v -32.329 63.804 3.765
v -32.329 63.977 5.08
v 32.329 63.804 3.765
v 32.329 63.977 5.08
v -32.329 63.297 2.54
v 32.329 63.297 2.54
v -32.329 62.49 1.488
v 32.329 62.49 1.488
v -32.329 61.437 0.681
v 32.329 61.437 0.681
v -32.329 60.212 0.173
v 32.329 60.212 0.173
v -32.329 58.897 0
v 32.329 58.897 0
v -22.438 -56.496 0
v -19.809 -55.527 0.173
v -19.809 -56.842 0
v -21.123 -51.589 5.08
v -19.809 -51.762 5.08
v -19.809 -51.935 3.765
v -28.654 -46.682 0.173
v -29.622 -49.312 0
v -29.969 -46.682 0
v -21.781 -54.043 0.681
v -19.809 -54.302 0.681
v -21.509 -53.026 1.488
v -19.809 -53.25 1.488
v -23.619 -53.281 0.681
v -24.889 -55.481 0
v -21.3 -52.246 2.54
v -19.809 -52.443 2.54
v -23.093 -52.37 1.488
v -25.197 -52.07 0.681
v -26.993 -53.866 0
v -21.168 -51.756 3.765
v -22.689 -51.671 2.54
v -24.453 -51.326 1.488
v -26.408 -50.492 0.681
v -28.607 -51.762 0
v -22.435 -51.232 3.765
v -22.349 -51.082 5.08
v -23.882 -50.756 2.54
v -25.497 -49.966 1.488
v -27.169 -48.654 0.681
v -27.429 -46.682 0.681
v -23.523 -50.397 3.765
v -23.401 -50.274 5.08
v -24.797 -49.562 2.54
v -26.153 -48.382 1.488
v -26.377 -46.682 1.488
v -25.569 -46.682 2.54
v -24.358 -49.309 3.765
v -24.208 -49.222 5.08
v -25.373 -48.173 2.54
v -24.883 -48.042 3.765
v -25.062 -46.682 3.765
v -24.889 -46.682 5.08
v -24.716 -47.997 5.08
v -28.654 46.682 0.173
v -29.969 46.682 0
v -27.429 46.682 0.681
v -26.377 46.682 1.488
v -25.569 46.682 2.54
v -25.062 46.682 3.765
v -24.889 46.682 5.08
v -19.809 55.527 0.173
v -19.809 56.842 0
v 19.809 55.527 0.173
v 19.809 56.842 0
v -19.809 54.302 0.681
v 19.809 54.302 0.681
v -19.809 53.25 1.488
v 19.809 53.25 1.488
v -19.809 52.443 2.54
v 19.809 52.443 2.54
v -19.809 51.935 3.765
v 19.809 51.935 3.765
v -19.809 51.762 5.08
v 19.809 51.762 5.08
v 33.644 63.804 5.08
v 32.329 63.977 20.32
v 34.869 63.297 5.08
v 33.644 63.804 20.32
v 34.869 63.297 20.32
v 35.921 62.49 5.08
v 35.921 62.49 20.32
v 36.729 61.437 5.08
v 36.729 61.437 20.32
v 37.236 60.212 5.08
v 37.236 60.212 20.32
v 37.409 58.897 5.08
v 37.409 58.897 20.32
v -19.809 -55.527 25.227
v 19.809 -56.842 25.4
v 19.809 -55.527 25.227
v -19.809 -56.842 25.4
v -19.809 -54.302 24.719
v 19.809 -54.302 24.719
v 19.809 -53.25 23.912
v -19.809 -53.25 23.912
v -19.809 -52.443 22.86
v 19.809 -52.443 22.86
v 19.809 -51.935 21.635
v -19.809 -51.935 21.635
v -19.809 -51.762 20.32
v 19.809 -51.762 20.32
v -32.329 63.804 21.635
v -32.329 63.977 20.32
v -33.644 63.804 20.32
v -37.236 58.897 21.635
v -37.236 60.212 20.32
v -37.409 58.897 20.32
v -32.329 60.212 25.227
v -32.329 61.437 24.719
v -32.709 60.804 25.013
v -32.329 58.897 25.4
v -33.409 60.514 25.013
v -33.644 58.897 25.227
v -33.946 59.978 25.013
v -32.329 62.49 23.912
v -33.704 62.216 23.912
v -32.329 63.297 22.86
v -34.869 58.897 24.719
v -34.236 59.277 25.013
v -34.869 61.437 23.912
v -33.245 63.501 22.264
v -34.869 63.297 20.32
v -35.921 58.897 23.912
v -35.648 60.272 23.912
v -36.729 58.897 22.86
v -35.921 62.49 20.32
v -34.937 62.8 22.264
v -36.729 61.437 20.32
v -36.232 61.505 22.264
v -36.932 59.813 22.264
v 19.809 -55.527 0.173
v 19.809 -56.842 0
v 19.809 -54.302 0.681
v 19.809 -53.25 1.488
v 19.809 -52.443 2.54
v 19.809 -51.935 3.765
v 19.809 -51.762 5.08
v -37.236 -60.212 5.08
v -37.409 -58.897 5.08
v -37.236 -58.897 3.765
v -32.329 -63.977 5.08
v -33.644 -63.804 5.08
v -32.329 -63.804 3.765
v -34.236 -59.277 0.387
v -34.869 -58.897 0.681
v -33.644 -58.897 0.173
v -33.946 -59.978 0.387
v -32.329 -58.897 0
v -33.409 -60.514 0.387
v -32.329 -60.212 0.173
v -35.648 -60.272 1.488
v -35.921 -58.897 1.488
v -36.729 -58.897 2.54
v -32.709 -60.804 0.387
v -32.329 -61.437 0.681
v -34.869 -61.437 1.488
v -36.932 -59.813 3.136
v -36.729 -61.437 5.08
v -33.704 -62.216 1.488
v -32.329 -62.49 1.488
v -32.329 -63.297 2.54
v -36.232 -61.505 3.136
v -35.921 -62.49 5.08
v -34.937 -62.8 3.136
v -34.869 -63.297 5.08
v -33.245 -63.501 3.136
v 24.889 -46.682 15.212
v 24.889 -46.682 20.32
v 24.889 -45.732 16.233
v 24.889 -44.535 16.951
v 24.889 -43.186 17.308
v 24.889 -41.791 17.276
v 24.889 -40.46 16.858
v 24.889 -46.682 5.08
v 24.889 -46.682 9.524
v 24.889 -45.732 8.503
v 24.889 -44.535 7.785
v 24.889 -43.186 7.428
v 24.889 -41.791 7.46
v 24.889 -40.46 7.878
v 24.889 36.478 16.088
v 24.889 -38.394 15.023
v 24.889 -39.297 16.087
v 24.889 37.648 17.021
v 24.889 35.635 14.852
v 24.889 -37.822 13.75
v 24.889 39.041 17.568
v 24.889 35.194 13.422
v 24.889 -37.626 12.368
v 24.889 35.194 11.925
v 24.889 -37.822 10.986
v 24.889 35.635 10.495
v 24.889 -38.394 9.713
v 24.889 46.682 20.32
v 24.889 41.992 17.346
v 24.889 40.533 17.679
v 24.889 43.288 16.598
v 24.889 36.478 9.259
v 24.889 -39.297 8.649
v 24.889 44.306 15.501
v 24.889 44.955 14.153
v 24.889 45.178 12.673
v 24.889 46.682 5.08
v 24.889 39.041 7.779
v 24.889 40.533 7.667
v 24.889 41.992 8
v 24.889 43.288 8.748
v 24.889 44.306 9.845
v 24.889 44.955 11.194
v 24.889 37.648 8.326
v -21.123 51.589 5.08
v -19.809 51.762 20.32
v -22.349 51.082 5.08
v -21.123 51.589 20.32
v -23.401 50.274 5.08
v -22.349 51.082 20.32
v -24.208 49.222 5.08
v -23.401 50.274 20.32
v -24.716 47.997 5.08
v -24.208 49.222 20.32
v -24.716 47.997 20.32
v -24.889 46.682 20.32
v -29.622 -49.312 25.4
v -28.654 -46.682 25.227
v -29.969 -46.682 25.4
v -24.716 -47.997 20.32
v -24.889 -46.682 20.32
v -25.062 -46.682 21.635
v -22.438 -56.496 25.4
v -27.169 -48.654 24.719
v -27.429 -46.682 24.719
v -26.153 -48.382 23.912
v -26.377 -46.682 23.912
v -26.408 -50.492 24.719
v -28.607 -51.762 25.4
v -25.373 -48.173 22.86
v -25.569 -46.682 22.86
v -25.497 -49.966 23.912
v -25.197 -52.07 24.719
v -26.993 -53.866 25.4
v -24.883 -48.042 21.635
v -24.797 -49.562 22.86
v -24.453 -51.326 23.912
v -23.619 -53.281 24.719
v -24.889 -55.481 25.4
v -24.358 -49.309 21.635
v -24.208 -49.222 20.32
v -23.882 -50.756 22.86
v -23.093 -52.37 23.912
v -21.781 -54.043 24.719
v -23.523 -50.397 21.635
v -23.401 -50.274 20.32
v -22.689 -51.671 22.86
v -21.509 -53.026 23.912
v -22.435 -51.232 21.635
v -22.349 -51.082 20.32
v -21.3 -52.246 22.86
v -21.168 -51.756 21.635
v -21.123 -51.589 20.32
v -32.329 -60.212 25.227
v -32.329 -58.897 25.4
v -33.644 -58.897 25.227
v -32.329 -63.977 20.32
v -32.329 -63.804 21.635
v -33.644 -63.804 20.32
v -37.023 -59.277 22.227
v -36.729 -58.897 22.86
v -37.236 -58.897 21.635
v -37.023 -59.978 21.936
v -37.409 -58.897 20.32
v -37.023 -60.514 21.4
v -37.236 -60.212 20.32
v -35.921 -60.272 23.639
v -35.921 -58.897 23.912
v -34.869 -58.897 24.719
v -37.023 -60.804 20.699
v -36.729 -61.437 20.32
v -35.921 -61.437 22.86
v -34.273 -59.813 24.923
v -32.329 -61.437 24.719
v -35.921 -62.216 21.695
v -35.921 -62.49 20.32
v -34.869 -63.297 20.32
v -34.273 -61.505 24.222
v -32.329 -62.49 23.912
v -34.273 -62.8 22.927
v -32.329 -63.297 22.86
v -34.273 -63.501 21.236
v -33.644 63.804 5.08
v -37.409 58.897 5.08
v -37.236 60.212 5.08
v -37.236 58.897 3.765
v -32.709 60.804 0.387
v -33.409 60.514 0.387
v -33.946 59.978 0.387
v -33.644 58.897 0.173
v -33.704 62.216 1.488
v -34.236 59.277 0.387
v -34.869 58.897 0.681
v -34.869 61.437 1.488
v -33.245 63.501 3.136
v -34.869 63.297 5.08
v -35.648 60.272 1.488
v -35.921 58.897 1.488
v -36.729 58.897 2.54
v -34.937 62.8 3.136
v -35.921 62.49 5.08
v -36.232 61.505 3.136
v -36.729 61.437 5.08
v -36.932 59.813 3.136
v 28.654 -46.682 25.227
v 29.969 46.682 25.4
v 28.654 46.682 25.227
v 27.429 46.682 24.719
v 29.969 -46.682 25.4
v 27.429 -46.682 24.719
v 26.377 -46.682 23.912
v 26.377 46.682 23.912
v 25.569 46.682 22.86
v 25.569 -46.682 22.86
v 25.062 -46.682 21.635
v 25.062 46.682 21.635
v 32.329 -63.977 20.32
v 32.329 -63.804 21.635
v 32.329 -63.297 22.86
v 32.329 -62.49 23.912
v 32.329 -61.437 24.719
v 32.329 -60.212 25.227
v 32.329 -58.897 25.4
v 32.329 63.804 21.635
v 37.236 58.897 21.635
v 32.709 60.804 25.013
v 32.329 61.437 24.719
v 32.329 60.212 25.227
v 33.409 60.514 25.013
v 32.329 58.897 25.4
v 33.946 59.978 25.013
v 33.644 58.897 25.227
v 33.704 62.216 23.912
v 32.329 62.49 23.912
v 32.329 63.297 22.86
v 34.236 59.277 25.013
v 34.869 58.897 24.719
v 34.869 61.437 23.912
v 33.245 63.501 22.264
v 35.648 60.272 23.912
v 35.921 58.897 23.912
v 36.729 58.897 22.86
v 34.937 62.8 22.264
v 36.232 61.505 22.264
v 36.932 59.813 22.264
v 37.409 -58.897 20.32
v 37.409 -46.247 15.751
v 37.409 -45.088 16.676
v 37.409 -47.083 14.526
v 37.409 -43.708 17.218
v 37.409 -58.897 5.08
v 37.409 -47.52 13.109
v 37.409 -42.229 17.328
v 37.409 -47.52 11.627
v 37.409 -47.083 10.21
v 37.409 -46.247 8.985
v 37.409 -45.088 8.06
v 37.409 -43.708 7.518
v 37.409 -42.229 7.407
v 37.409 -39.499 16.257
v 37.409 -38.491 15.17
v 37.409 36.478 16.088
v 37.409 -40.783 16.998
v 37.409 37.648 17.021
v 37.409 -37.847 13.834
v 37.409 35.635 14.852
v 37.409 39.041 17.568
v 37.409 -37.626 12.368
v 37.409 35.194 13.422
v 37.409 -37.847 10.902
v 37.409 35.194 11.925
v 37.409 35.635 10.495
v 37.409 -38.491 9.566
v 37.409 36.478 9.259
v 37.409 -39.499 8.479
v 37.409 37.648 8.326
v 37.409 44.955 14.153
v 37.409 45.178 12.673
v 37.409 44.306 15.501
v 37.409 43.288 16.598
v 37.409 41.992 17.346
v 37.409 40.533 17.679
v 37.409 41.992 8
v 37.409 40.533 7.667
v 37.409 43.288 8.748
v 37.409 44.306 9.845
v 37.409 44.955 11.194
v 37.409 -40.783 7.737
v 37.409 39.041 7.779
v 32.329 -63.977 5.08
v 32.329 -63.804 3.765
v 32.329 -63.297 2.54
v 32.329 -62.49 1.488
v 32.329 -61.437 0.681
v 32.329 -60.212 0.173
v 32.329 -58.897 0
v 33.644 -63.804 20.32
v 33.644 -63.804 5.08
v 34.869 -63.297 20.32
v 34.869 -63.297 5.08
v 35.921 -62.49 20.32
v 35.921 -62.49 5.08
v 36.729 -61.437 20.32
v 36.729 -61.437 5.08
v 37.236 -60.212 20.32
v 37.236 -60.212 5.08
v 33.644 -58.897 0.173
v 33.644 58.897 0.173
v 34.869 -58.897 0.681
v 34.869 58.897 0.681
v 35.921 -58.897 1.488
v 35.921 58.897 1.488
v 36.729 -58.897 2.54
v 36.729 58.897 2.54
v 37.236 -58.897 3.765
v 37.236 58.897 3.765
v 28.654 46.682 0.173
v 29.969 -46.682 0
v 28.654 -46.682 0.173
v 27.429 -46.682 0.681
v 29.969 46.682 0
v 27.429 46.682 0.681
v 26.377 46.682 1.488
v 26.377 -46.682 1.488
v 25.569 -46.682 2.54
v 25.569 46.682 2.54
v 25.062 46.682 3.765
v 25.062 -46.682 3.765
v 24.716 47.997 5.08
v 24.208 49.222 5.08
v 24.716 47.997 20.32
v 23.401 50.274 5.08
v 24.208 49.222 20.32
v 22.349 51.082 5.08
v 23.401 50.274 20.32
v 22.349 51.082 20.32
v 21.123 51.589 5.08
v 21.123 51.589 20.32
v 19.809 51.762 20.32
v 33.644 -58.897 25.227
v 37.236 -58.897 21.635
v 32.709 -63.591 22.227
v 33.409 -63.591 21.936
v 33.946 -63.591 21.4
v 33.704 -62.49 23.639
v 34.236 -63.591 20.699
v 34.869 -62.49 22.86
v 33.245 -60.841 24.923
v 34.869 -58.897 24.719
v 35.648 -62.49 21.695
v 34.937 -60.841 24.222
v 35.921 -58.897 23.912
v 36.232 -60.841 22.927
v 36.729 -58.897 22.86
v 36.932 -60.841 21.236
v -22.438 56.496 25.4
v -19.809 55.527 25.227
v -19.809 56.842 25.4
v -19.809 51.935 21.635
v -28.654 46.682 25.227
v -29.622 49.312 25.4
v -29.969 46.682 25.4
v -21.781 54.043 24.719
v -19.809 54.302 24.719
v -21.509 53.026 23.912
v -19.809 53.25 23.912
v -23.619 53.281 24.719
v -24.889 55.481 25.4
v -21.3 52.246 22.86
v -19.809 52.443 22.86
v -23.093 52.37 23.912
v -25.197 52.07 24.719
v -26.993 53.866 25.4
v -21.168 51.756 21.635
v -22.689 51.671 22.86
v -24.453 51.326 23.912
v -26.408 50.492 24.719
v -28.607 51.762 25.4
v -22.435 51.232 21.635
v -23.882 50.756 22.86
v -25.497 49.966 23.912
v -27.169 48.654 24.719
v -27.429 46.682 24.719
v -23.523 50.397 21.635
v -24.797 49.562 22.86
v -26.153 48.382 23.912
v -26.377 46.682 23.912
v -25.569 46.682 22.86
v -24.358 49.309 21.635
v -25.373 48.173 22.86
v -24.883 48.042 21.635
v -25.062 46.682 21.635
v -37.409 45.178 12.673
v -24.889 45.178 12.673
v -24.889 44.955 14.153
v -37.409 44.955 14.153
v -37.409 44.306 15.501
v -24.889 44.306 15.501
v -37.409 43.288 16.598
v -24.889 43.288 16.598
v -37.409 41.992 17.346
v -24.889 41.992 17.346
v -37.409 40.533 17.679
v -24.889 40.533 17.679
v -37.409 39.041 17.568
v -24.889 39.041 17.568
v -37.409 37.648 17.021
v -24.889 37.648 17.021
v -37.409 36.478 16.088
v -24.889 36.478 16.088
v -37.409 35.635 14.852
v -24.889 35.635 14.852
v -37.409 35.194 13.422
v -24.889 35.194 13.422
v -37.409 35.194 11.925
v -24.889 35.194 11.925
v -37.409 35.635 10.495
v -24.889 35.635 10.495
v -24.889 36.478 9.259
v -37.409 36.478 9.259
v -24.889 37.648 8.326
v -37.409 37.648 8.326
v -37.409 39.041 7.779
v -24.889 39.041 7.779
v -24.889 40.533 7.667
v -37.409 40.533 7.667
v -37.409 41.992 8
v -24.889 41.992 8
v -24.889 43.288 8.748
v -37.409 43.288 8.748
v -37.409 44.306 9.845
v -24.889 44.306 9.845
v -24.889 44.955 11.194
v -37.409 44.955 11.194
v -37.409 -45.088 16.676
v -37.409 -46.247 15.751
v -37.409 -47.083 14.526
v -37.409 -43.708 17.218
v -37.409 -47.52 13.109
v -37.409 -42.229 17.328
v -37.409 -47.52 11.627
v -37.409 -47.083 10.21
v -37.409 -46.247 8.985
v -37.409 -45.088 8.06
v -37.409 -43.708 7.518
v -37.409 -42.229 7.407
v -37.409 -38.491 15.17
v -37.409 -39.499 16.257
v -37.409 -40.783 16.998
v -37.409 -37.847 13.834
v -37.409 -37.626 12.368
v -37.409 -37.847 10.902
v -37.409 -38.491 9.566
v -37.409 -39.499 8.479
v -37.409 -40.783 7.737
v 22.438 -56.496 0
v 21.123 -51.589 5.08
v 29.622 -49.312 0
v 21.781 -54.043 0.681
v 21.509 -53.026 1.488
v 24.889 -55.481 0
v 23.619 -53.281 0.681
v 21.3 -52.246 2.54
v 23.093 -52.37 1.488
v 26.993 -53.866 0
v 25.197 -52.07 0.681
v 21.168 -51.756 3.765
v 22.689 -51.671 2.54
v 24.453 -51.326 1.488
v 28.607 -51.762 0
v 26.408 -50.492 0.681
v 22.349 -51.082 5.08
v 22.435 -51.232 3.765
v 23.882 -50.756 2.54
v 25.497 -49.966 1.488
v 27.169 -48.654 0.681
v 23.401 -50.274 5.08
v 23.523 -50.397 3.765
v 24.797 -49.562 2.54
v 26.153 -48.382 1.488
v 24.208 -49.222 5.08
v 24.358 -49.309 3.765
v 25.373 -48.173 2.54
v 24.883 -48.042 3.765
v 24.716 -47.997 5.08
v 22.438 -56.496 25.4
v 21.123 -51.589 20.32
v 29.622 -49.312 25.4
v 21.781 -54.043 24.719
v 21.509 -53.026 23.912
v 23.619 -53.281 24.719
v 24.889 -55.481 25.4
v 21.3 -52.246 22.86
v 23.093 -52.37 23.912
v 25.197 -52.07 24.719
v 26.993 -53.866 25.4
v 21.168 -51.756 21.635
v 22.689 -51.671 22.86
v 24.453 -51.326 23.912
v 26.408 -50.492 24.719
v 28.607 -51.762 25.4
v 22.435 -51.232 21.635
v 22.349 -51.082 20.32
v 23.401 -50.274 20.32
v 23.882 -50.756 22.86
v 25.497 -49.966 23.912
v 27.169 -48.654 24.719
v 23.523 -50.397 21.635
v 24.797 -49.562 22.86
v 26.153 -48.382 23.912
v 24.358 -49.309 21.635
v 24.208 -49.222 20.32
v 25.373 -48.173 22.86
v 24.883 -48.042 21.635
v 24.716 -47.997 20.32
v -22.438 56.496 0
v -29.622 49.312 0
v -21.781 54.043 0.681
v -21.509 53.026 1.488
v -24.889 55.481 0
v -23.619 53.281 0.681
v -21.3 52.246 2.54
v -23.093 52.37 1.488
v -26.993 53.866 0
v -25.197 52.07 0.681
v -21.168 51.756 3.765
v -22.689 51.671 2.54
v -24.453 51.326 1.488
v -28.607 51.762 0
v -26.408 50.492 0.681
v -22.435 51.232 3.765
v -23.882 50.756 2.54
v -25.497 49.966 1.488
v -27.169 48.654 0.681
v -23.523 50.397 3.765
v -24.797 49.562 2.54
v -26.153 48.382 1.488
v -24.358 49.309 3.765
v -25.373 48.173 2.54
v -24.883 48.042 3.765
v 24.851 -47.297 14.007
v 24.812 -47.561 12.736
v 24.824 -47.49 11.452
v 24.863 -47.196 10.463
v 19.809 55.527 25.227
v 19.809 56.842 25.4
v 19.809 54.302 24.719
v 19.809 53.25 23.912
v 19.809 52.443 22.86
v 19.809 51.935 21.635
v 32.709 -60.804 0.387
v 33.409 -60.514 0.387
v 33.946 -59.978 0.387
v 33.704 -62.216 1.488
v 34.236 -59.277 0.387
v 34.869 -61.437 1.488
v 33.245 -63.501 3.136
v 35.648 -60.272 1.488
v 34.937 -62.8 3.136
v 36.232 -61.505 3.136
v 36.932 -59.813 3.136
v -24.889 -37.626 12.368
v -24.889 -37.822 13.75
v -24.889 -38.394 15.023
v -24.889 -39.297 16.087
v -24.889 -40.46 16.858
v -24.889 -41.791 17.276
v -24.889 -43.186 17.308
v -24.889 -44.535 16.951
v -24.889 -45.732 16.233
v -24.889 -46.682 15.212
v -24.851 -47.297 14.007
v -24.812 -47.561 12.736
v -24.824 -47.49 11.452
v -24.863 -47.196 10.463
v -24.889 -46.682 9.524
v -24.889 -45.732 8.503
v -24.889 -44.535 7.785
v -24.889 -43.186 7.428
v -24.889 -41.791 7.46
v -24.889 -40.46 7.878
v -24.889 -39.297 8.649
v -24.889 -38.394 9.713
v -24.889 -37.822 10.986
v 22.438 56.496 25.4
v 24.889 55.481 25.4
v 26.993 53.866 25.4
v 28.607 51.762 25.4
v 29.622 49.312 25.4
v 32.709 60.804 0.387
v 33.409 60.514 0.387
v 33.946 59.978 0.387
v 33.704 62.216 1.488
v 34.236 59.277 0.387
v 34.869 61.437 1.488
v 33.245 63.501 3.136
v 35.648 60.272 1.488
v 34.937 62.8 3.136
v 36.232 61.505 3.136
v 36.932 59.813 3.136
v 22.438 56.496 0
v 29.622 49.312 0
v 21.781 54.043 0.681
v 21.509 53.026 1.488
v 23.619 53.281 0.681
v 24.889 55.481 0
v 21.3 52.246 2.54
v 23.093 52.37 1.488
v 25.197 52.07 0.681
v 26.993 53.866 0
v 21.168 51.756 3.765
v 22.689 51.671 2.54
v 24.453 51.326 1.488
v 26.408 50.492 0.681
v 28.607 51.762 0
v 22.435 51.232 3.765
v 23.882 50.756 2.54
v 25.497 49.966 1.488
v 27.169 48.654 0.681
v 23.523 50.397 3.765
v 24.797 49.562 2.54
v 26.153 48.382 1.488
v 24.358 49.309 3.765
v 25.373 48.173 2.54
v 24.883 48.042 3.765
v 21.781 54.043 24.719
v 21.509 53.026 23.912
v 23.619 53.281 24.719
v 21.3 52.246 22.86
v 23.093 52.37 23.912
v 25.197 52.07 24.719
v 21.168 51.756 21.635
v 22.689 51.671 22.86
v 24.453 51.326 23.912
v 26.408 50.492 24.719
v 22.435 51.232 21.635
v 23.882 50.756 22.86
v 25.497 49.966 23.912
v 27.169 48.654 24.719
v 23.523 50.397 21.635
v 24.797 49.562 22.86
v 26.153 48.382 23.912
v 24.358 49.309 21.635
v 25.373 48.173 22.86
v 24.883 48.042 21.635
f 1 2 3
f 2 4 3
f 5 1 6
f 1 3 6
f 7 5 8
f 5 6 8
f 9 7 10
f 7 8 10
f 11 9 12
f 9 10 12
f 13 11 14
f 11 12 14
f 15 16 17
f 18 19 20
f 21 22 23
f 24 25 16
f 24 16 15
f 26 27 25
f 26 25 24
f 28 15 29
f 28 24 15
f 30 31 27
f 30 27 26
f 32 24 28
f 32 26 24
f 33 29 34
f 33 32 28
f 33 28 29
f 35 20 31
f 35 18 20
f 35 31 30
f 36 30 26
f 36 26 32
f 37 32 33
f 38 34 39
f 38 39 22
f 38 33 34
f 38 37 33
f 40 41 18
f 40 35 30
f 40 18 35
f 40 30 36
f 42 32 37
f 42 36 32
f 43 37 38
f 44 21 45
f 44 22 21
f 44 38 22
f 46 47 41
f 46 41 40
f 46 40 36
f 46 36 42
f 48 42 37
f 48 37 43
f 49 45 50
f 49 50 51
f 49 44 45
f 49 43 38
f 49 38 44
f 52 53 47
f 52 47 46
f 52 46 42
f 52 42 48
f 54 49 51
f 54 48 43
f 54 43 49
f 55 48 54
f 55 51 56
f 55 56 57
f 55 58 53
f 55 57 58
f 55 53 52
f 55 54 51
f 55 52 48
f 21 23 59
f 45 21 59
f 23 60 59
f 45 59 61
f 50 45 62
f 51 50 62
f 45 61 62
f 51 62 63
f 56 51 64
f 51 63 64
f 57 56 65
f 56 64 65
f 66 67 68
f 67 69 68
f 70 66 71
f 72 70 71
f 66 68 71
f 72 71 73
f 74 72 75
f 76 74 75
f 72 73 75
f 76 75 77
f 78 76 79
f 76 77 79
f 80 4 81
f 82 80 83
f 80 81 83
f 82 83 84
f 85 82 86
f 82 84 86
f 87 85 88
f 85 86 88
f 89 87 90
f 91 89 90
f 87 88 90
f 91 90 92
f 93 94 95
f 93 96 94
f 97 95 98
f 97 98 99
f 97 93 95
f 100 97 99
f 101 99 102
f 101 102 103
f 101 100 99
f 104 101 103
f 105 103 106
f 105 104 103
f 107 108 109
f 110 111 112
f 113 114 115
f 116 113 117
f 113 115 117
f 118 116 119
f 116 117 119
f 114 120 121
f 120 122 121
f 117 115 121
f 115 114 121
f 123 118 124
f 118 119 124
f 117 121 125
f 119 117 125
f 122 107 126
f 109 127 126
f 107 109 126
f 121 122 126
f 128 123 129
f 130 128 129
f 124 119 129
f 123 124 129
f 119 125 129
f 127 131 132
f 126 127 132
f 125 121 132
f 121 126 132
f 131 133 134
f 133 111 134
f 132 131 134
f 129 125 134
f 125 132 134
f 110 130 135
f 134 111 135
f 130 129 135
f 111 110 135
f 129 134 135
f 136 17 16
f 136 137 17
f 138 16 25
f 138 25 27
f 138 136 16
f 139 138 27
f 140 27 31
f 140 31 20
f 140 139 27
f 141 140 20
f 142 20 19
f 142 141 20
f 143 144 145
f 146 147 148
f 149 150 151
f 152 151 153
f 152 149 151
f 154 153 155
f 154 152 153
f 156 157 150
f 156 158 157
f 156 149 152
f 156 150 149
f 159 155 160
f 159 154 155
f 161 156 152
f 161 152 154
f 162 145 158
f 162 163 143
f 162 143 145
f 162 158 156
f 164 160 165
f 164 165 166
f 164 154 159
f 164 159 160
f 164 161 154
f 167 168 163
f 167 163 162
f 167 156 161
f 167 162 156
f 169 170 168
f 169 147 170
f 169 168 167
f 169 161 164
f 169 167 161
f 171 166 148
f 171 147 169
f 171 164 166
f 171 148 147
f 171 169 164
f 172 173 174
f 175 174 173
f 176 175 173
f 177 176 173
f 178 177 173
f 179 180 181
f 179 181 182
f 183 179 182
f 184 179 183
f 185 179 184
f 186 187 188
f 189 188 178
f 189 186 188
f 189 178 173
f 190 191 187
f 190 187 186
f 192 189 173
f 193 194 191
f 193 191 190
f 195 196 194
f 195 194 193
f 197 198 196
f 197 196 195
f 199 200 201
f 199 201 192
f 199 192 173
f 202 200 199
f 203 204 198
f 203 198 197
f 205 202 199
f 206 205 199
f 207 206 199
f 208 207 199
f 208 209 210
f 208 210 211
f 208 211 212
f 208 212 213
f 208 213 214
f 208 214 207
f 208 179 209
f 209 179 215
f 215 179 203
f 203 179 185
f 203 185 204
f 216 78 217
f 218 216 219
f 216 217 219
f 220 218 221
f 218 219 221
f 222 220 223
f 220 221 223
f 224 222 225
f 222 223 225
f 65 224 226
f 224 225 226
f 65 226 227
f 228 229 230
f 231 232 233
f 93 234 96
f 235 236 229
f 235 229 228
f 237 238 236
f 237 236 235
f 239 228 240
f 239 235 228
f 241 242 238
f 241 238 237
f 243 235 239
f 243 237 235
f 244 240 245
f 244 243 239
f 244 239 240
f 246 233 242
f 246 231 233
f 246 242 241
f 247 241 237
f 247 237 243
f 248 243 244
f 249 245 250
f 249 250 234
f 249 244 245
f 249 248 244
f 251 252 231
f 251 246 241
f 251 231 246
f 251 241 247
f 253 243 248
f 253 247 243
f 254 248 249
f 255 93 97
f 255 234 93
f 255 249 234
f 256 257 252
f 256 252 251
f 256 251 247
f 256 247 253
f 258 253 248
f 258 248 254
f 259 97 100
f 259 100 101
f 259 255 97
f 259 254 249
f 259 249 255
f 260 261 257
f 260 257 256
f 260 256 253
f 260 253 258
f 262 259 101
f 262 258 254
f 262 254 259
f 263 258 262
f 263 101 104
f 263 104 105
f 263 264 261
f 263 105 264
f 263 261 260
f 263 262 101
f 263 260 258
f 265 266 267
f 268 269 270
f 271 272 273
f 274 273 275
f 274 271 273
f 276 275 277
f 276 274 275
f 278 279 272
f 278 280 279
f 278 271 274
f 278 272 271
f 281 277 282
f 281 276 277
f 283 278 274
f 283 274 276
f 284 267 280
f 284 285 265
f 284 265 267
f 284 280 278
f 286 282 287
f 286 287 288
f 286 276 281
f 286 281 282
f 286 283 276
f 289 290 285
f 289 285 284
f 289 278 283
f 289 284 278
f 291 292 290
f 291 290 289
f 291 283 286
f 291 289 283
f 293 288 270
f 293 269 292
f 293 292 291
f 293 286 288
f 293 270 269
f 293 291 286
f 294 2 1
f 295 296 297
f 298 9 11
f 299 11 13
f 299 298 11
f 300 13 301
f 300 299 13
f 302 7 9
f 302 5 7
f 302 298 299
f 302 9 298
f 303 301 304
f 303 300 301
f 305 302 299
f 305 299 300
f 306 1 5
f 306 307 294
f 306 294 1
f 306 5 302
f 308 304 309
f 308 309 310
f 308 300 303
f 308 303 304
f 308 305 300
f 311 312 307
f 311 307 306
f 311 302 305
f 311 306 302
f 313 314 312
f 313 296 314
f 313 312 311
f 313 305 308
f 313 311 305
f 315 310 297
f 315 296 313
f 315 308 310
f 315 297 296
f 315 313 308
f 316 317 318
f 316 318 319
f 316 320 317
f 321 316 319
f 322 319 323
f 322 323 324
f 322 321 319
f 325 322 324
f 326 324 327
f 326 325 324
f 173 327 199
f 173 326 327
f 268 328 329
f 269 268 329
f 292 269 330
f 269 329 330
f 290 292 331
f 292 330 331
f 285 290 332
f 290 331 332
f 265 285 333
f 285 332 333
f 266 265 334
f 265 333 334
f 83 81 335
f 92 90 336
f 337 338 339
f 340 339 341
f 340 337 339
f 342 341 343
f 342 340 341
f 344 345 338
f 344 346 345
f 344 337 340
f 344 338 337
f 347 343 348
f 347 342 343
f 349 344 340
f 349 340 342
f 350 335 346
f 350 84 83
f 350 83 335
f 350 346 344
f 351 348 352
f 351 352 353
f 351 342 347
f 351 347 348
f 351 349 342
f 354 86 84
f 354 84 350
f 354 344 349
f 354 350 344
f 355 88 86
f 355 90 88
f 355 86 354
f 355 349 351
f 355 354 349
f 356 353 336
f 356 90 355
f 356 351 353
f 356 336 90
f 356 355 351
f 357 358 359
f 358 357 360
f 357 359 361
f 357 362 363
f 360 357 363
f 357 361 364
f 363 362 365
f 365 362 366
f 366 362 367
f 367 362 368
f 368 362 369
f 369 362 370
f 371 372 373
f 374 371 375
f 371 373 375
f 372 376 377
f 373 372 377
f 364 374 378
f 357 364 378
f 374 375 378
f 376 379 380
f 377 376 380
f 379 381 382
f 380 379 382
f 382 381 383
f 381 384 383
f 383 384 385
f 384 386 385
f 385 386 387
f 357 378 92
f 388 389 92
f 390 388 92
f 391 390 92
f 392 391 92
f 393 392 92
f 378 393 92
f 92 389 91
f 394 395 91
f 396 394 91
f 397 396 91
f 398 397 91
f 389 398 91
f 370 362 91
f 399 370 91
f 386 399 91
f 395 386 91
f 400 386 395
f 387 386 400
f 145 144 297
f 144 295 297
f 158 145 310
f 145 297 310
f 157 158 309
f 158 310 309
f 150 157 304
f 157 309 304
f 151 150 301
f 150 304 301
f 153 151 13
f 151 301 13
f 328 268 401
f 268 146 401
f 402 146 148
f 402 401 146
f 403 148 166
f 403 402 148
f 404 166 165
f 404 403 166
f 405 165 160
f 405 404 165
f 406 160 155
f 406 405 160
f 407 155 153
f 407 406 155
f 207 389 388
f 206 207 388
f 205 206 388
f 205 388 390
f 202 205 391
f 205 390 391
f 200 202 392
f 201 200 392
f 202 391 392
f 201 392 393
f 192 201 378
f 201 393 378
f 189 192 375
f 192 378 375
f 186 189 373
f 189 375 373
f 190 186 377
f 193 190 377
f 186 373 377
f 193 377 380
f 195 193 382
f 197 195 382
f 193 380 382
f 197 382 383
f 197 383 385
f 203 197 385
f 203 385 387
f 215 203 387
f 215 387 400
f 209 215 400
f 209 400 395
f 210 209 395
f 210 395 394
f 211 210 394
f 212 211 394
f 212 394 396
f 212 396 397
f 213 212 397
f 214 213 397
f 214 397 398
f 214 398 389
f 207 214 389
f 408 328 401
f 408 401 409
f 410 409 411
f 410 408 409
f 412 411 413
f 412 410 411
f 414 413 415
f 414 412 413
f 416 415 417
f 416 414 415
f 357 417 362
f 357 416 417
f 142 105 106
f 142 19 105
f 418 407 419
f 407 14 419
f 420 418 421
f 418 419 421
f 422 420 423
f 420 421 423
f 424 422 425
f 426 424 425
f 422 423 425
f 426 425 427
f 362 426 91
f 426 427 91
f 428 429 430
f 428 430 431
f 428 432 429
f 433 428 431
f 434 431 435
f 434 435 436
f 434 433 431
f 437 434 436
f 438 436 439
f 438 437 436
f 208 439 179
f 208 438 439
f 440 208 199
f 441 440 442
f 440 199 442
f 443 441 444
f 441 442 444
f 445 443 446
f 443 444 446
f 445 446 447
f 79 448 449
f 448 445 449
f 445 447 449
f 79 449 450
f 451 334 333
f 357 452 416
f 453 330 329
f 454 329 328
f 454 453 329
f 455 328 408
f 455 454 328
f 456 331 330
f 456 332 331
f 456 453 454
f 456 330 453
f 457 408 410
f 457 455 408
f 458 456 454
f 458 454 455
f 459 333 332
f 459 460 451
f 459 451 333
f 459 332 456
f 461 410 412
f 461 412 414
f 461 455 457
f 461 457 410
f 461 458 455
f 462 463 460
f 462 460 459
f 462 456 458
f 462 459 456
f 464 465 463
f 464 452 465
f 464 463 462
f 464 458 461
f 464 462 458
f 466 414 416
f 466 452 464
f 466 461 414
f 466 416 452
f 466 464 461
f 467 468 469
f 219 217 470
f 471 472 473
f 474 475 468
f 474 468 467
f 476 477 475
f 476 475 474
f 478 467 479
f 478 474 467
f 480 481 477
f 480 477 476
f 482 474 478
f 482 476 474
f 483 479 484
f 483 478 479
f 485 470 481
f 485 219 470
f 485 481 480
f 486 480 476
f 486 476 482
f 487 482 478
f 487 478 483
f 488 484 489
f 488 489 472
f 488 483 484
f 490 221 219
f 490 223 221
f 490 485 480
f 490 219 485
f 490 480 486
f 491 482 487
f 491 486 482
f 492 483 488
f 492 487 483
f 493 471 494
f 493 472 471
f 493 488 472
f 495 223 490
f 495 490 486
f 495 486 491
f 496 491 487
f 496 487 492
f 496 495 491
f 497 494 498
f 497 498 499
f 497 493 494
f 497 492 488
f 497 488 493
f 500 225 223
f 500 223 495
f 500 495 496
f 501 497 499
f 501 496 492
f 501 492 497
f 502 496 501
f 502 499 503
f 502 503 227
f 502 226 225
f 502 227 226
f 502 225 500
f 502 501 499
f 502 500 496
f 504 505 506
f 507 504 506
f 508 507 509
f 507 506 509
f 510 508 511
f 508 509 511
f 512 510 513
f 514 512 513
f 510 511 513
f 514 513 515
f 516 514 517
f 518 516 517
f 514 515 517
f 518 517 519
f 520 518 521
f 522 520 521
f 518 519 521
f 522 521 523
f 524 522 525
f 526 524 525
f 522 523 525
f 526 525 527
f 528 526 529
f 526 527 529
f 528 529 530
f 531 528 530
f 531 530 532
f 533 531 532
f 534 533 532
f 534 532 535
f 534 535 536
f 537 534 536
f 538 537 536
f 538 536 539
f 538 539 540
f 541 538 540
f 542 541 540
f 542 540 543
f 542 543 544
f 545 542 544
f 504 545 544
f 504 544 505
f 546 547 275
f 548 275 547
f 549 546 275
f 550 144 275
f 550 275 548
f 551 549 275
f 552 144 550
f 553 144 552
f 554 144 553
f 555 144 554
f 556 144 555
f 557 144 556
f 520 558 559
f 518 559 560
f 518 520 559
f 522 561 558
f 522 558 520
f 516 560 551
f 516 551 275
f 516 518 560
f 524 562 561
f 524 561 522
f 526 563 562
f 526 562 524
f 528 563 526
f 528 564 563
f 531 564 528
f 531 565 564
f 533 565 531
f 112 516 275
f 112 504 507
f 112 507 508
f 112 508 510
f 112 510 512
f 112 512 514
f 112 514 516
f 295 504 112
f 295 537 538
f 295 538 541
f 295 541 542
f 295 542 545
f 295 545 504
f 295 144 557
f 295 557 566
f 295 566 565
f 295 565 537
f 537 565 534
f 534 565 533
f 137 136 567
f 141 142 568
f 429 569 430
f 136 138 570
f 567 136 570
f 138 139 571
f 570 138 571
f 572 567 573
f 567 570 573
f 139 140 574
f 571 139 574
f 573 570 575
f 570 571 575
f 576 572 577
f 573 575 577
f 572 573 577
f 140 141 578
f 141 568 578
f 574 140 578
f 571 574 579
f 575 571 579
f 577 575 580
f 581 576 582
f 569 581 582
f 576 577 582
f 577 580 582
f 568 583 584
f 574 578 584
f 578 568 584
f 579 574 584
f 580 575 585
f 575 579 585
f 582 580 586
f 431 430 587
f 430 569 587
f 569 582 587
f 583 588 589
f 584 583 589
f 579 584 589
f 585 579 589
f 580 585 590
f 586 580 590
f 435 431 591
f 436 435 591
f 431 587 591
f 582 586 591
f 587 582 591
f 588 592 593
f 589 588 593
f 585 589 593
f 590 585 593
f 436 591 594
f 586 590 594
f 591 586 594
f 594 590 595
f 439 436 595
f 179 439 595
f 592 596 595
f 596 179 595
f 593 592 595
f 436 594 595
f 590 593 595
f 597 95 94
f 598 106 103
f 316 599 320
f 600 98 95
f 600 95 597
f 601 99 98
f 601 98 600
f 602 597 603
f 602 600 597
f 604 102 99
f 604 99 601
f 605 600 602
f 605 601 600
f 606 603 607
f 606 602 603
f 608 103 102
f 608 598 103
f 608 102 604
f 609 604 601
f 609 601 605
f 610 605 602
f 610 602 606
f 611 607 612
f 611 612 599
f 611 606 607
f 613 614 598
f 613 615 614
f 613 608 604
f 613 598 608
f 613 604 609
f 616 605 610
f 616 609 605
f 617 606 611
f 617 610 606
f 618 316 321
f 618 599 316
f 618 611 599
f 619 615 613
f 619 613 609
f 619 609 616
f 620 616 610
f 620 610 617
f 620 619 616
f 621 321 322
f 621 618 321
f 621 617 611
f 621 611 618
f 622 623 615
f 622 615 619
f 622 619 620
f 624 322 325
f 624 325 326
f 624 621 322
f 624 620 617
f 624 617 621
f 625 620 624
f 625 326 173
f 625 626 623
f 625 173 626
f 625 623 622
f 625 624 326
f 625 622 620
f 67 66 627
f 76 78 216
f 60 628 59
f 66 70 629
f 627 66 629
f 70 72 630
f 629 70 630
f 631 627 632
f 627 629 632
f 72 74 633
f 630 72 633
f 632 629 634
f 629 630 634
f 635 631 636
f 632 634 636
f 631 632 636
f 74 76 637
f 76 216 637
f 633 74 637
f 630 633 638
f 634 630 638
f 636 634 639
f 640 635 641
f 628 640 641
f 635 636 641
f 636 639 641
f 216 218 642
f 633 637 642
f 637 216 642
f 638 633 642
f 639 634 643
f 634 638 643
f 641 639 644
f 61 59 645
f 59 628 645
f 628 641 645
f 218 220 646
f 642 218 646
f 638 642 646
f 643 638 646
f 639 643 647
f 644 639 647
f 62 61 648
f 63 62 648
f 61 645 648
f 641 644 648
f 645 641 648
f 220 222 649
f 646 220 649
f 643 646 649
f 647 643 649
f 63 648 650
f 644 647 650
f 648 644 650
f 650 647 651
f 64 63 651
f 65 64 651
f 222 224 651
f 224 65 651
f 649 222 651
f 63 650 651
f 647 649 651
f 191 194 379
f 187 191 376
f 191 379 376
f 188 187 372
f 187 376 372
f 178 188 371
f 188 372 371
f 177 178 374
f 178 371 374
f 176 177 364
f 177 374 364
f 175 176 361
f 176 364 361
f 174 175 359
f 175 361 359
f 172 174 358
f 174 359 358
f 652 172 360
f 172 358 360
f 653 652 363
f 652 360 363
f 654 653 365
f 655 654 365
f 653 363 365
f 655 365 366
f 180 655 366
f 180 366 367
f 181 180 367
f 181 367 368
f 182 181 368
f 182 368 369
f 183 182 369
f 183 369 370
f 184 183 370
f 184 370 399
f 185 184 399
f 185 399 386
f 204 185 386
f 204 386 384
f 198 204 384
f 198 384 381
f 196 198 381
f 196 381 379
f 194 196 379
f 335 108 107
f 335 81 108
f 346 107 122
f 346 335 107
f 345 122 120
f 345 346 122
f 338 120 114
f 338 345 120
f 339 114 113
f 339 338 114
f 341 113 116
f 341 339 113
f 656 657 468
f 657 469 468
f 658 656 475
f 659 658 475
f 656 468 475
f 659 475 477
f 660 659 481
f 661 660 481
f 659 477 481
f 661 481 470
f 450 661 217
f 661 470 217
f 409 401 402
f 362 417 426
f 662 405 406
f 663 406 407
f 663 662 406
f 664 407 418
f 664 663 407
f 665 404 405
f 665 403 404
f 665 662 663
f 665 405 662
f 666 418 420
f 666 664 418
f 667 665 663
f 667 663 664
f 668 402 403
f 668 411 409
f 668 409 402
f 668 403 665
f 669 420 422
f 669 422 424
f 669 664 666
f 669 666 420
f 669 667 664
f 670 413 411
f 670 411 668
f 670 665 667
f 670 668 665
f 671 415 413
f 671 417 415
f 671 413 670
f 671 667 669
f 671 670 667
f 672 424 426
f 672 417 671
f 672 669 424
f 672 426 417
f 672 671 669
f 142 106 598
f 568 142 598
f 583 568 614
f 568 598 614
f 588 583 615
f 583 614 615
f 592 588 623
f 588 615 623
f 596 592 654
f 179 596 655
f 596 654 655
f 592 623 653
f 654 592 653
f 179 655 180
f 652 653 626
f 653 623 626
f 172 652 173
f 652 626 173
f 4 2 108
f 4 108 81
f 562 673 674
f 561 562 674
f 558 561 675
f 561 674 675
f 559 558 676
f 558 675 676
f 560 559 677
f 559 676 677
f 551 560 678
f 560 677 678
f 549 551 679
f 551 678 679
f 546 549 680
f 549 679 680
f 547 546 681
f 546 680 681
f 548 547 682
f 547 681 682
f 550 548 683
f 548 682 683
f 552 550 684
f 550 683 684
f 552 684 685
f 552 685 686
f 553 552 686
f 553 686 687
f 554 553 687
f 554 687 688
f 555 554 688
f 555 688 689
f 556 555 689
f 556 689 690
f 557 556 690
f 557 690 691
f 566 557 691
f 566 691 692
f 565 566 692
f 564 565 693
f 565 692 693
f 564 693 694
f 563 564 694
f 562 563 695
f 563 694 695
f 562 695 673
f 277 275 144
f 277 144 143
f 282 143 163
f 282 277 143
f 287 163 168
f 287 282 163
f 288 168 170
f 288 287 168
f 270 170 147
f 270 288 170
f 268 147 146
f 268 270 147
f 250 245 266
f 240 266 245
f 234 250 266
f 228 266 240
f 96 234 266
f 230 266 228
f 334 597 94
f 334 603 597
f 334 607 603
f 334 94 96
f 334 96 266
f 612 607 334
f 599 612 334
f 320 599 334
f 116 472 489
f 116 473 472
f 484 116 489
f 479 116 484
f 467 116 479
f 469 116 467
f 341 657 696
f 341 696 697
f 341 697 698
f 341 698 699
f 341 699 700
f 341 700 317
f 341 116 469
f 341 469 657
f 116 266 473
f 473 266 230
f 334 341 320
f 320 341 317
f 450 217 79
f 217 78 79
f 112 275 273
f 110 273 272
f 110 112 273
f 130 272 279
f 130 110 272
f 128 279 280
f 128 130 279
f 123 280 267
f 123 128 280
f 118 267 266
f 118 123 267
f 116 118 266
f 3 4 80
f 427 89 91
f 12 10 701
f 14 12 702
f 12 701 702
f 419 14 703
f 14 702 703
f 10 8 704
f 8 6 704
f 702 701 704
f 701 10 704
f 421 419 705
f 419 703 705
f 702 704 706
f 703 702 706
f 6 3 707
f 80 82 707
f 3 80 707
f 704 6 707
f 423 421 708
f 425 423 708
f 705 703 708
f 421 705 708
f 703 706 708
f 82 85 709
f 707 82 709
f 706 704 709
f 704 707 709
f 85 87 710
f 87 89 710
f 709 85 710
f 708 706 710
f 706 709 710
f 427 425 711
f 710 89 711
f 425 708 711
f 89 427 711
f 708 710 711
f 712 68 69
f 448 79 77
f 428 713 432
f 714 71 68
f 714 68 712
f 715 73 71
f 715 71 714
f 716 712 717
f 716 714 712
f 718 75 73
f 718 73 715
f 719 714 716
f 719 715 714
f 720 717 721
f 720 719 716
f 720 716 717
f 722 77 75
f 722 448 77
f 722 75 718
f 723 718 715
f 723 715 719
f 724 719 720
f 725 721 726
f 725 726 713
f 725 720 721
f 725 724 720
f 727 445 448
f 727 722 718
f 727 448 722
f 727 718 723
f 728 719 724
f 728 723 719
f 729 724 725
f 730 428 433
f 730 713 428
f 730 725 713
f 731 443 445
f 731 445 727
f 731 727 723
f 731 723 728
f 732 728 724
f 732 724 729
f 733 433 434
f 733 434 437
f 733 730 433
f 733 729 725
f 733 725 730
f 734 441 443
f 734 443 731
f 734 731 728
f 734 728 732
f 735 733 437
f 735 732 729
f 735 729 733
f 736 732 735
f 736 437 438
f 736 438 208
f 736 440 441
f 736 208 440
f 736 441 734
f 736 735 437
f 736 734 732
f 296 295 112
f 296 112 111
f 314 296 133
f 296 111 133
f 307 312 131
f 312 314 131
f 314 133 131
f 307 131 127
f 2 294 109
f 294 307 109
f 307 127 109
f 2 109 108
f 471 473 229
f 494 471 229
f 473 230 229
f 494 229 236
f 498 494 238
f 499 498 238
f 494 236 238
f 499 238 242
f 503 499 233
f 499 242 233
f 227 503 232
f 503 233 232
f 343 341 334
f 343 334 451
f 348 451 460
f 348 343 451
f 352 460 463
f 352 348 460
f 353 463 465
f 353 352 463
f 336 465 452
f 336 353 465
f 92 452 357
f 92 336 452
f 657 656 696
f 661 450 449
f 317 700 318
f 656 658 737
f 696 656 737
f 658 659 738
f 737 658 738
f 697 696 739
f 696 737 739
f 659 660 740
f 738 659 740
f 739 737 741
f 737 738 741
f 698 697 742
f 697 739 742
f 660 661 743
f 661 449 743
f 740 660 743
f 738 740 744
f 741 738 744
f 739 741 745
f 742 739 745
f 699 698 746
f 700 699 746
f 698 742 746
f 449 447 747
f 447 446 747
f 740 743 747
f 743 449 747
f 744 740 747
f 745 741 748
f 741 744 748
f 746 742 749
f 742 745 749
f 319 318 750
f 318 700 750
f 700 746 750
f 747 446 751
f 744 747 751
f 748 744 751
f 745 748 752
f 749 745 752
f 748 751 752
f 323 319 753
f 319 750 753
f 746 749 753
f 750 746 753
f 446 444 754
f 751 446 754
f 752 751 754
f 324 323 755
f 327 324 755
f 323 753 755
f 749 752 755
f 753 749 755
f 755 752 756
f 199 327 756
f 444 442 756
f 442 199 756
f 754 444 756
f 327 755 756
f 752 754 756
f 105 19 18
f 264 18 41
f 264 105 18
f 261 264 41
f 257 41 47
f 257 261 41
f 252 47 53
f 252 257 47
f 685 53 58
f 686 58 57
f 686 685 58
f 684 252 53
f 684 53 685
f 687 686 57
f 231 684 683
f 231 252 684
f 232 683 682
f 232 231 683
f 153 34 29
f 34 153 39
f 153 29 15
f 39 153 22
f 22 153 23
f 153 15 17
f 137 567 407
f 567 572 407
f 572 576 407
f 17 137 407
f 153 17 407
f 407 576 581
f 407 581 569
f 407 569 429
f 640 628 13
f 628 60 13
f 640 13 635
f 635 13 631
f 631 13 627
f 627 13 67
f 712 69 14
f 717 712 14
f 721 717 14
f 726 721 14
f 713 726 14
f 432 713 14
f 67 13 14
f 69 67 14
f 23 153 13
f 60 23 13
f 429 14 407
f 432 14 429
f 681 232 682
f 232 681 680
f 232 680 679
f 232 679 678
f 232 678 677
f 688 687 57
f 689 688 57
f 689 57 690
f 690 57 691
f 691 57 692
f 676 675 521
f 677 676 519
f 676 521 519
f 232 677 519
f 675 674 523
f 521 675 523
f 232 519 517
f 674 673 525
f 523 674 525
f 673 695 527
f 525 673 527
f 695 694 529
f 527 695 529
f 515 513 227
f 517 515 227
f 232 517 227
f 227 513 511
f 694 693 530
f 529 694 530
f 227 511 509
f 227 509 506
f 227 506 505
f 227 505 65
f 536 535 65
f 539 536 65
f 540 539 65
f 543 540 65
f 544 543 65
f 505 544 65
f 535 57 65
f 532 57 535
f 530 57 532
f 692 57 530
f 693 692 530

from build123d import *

# Parameters (mm, degrees)
F0_W     = 74.8185142875
F0_H     = 127.9549151659
F1_DEPTH = 25.4
F2_W     = 49.7772097588
F2_H     = 103.5243868828
F3_DEPTH = 38.1
F4_R     = 5.08
F5_R     = 4.9743780925
F6_DEPTH = 127
F7_R     = 5.0201571666
F8_DEPTH = 127


with BuildPart() as f1:
    # F0 (on Top) → F1 (new body)
    with BuildSketch(Plane.XY):
        Rectangle(F0_W, F0_H)
    extrude(amount=F1_DEPTH)

    # F2 (on Top) → F3 (cut)
    with BuildSketch(Plane.XY):
        Rectangle(F2_W, F2_H)
    extrude(amount=F3_DEPTH, mode=Mode.SUBTRACT)

    # F4
    f4_edges = [f1.edges().sort_by_distance(p)[0] for p in [
        (37.409257, 63.977458, 12.7),
        (-37.409257, 63.977458, 12.7),
        (0, 63.977458, 0),
        (0, 63.977458, 25.4),
        (37.409257, 0, 25.4),
        (0, -63.977458, 25.4),
        (-37.409257, 0, 25.4),
        (0, 51.762193, 25.4),
        (-24.888605, 0, 25.4),
        (0, -51.762193, 25.4),
        (24.888605, 0, 25.4),
        (-37.409257, -63.977458, 12.7),
        (-37.409257, 0, 0),
        (37.409257, -63.977458, 12.7),
        (0, -63.977458, 0),
        (37.409257, 0, 0),
        (-24.888605, 0, 0),
        (-24.888605, -51.762193, 12.7),
        (-24.888605, 51.762193, 12.7),
        (24.888605, 0, 0),
        (24.888605, 51.762193, 12.7),
        (24.888605, -51.762193, 12.7),
        (0, -51.762193, 0),
        (0, 51.762193, 0),
    ]]
    fillet(f4_edges, radius=F4_R)

    # F5 (on face) → F6 (cut)
    with BuildSketch(Plane.YZ.offset(37.4092571437)):
        with Locations((-42.6007434726, 12.3679572716)):
            Circle(F5_R)
    extrude(amount=-F6_DEPTH, mode=Mode.SUBTRACT)

    # F7 (on face) → F8 (cut)
    with BuildSketch(Plane.YZ.offset(37.4092571437)):
        with Locations((40.1576943696, 12.6733398065)):
            Circle(F7_R)
    extrude(amount=-F8_DEPTH, mode=Mode.SUBTRACT)


solid = f1.part
